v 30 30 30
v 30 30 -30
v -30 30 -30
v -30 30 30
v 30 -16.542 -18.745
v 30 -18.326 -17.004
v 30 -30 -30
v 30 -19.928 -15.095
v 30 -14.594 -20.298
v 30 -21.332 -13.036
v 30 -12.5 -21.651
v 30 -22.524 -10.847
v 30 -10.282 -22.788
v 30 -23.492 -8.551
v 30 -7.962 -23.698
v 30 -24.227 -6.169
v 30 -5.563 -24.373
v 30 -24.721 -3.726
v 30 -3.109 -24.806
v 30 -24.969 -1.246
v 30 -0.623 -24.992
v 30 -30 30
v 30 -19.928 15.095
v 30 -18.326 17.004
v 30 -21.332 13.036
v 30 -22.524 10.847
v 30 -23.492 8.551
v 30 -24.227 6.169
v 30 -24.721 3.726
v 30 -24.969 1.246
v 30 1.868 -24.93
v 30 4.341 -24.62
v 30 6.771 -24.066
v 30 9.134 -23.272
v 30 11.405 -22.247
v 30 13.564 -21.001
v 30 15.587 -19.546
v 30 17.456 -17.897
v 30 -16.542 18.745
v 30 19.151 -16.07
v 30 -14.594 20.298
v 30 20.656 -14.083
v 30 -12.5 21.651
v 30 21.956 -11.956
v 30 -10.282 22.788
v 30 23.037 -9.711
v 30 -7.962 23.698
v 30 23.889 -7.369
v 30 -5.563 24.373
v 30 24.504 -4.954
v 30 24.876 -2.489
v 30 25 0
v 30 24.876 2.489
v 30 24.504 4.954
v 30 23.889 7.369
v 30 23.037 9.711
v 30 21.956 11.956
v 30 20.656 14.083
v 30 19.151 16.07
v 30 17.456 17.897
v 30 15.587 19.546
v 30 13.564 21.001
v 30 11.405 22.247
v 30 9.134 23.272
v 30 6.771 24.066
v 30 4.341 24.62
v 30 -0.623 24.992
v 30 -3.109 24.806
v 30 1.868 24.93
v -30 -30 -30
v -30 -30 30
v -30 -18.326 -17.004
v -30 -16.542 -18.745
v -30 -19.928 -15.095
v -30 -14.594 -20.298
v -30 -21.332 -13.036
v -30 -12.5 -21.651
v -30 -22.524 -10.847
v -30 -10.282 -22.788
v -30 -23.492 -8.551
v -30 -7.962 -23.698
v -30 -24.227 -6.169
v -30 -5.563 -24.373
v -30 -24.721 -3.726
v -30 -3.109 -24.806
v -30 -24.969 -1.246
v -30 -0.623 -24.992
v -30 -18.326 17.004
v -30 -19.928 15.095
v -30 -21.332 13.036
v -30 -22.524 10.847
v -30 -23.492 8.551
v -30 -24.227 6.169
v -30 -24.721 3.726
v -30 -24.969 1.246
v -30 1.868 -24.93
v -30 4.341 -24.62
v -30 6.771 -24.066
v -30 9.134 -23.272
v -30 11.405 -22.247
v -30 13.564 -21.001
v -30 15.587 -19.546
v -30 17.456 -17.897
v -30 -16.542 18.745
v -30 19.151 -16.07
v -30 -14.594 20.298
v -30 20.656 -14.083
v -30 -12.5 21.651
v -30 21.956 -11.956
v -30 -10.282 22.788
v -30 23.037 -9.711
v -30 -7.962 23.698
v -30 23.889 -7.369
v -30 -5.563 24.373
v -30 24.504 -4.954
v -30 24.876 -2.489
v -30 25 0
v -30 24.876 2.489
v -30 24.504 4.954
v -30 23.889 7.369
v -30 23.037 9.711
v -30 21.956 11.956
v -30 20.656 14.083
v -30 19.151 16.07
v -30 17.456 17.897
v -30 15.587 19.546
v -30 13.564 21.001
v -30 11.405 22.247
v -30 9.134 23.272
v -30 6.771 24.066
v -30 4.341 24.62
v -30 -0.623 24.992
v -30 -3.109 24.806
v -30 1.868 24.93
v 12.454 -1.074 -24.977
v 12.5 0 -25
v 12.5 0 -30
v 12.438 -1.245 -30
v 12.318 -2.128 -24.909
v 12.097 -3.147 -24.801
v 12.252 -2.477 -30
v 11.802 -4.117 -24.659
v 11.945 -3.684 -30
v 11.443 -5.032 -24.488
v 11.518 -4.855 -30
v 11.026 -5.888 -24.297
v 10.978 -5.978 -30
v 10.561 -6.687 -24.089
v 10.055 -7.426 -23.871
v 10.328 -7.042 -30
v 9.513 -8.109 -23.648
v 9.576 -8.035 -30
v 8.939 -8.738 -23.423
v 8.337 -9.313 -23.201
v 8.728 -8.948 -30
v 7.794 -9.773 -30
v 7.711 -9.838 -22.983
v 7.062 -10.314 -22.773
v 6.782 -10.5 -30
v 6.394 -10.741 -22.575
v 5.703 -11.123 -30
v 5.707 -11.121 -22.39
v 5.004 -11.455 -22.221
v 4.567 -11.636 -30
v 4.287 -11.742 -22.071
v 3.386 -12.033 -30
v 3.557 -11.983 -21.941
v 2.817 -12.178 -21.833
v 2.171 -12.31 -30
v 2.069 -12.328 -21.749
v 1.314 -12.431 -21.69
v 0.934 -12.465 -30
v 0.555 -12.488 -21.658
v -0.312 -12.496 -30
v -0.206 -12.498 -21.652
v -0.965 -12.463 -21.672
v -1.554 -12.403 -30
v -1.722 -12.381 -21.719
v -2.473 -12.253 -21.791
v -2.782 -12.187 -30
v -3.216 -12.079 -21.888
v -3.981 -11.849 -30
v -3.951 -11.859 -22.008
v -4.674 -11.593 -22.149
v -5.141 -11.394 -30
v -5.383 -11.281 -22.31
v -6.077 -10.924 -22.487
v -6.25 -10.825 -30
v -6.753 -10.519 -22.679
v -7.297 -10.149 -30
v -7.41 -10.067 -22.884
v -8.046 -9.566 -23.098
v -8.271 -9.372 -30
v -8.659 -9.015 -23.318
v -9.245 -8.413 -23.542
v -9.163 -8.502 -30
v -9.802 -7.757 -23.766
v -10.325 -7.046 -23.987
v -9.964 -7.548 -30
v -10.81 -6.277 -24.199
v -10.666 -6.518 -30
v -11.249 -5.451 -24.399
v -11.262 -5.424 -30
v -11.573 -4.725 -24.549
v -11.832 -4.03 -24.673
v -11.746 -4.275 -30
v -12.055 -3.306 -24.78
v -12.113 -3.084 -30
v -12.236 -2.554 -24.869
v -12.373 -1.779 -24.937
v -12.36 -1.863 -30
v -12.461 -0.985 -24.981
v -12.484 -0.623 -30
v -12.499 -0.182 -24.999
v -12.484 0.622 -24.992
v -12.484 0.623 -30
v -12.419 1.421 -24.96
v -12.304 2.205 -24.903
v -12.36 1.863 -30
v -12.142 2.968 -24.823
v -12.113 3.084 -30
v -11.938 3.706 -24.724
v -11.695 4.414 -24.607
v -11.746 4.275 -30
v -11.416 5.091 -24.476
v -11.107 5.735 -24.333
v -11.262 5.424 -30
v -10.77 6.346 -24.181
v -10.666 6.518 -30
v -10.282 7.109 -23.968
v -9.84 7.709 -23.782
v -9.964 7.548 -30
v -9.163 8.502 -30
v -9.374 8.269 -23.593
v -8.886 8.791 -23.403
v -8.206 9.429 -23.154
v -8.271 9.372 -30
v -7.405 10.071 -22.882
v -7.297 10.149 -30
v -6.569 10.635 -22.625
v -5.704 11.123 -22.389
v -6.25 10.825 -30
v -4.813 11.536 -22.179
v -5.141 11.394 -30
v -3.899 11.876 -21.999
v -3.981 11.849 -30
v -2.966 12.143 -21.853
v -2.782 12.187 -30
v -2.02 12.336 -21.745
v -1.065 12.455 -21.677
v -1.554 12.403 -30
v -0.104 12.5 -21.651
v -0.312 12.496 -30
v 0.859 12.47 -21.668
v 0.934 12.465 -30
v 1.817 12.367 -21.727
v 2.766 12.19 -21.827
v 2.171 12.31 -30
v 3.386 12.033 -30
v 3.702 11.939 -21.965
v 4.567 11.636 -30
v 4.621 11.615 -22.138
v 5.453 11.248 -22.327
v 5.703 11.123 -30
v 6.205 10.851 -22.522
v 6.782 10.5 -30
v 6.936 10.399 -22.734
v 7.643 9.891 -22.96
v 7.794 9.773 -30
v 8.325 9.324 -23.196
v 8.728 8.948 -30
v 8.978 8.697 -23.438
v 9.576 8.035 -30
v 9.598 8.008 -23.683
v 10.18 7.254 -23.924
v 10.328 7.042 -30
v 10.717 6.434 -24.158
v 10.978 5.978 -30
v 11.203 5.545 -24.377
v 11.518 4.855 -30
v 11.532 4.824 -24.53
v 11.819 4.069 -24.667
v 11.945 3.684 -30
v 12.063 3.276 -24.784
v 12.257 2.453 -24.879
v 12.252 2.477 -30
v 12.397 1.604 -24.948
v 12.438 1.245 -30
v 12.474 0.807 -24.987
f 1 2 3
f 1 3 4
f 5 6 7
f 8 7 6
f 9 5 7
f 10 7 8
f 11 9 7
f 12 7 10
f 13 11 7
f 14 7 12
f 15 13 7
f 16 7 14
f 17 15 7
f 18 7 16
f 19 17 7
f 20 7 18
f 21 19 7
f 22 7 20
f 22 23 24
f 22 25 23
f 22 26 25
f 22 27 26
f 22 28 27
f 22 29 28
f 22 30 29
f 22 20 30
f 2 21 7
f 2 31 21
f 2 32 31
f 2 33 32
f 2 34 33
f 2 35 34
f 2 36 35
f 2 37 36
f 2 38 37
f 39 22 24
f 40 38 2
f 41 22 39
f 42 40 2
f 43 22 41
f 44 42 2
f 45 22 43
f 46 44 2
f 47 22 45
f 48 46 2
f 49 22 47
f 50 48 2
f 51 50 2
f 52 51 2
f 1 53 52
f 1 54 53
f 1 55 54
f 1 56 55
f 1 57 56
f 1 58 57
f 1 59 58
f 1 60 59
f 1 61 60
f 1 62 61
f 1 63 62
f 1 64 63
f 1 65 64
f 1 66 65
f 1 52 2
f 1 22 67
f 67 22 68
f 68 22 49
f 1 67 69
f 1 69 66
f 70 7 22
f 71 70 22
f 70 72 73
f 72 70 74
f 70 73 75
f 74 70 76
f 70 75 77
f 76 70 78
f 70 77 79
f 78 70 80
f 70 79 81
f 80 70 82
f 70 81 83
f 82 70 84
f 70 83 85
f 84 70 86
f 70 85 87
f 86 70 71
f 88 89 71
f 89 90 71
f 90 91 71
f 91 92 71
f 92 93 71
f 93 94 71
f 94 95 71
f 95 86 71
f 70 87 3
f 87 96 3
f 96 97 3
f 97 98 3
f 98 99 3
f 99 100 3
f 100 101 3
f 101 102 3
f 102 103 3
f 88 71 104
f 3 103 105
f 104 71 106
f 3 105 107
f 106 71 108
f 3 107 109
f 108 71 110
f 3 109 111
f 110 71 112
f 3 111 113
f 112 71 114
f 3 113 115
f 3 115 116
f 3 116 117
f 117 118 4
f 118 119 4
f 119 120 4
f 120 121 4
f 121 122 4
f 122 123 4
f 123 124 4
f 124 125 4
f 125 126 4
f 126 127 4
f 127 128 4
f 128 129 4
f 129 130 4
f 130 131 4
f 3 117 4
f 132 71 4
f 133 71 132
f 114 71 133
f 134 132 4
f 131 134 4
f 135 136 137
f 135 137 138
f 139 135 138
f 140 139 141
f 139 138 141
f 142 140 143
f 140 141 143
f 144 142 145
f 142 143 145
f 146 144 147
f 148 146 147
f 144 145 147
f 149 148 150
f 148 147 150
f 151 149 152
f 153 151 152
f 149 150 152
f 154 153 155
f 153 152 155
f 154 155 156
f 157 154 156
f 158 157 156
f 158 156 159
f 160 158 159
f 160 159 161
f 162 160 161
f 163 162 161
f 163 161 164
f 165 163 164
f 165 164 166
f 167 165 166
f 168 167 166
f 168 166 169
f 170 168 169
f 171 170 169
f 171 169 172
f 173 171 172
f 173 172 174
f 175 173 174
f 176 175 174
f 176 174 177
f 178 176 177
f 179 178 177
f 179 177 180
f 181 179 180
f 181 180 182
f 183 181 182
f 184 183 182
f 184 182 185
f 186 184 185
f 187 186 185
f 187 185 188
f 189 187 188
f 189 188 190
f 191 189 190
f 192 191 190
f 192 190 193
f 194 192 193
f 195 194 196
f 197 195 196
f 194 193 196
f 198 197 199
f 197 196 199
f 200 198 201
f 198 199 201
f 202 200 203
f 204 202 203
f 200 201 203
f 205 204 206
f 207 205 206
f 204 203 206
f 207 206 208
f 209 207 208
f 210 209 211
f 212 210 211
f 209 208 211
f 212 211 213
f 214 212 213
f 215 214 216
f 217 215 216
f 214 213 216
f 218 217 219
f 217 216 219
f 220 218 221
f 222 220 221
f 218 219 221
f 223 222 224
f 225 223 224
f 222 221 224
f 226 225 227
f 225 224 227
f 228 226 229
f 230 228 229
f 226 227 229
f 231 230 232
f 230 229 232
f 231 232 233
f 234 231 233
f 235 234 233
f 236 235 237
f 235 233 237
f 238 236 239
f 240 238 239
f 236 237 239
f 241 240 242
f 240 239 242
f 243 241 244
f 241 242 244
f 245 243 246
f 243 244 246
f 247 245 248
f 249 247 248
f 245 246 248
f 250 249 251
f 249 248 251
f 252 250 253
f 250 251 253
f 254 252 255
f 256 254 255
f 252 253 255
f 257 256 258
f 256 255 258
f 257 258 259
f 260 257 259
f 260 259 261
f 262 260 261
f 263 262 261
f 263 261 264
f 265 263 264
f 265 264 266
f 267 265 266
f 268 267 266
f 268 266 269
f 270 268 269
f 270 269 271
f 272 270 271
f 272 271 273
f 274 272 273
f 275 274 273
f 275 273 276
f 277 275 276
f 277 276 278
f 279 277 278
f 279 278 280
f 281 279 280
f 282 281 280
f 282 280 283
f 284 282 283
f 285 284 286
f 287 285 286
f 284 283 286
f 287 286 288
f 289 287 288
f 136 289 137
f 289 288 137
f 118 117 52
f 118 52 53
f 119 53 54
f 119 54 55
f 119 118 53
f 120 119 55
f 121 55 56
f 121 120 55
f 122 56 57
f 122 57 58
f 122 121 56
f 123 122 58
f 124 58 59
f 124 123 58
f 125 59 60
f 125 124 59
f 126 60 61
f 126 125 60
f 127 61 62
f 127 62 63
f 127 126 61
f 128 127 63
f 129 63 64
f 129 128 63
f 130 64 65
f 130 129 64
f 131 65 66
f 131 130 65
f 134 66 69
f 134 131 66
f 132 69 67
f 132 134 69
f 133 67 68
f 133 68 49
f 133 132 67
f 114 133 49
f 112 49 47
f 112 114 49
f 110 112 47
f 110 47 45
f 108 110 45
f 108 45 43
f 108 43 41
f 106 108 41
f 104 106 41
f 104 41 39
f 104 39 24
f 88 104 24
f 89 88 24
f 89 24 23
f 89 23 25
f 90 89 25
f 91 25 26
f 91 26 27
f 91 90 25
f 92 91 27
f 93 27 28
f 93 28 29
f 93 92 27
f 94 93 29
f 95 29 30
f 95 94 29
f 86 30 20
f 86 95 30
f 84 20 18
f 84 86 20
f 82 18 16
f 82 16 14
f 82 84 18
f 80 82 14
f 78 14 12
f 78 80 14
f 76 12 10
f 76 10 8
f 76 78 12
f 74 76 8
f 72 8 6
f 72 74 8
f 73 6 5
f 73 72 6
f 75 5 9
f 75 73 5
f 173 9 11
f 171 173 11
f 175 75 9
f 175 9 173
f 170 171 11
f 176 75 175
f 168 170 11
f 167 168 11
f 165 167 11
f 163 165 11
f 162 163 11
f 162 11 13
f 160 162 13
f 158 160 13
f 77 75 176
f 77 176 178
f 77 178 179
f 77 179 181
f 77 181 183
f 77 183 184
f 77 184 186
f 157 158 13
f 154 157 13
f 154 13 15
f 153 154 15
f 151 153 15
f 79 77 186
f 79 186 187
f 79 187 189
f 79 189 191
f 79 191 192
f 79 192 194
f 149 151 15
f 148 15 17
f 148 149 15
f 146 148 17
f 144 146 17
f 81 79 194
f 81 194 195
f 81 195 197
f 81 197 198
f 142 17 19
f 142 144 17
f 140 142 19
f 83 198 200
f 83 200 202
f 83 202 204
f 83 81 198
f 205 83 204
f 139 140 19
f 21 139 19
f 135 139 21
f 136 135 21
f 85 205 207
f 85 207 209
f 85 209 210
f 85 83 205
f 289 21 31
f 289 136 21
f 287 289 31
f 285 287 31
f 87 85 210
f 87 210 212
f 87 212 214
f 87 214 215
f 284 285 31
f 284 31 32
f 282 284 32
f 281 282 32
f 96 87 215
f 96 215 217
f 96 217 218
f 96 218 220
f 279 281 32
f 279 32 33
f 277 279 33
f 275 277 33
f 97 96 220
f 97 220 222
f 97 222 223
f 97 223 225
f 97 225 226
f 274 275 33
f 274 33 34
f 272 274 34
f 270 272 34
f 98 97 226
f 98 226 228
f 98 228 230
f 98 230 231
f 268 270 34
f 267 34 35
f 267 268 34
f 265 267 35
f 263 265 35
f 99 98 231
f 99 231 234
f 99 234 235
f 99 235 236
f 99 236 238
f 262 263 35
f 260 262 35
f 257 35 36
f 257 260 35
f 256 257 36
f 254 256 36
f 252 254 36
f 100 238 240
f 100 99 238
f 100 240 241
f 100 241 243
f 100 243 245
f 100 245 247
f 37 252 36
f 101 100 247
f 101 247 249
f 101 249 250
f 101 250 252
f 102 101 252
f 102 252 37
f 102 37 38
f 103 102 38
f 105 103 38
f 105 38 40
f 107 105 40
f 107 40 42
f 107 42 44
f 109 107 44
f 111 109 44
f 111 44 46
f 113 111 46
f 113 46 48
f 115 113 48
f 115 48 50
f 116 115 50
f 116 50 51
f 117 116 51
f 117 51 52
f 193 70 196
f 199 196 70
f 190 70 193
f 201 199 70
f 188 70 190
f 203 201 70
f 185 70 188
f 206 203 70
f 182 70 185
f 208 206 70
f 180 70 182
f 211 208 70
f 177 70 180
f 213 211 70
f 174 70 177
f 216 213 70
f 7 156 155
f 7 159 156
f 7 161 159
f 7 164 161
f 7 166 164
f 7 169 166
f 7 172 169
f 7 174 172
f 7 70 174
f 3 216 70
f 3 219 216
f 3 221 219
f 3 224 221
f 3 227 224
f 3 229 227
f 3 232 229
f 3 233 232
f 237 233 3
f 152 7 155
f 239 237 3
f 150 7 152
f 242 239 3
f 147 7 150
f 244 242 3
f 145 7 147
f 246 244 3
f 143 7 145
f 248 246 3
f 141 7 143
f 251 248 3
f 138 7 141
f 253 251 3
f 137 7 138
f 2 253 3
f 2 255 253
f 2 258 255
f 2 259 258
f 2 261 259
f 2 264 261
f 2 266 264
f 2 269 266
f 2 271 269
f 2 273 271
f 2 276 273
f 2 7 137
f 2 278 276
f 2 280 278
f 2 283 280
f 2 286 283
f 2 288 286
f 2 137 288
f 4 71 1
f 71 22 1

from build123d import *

# Parameters (mm, degrees)
F0_W          = 60
F0_H          = 60
F0_R          = 25
F1_DEPTH      = 30
F2_R          = 12.5
F3_DEPTH      = 25
F3_DEPTH_BACK = 25


with BuildPart() as f1:
    # F0 (on Right) → F1 (new body, symmetric)
    with BuildSketch(Plane.YZ):
        Rectangle(F0_W, F0_H)
        Circle(F0_R, mode=Mode.SUBTRACT)
    extrude(amount=F1_DEPTH, both=True)

    # F2 (on face) → F3 (cut, two sides)
    with BuildSketch(Plane(origin=(0, 0, -30), x_dir=(1, 0, 0), z_dir=(0, 0, -1))) as f3_sk:
        Circle(F2_R)
    extrude(amount=-F3_DEPTH, mode=Mode.SUBTRACT)
    extrude(f3_sk.sketch, amount=-F3_DEPTH_BACK, mode=Mode.SUBTRACT)


solid = f1.part
